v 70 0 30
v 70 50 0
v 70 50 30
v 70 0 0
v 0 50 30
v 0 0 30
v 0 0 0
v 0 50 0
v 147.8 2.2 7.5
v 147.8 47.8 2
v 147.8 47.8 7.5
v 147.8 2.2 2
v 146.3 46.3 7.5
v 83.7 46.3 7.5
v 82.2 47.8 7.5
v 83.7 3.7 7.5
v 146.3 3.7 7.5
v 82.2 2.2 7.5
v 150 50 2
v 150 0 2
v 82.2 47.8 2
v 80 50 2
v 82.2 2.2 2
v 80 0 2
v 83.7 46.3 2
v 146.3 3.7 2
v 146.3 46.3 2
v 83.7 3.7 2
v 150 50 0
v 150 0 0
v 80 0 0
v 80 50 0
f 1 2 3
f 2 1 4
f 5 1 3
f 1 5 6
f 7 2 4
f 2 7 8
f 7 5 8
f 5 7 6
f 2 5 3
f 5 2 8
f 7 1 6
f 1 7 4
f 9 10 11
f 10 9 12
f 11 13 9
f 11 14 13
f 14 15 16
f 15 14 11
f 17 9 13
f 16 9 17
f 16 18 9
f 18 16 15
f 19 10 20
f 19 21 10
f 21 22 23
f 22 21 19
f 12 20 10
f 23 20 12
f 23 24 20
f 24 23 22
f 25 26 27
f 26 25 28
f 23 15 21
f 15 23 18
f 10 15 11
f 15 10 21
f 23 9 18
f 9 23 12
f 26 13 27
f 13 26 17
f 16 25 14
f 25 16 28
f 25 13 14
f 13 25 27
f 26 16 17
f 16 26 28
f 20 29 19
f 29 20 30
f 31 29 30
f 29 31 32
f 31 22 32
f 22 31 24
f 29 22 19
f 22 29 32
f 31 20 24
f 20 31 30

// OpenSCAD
// Two-part enclosure for electronics board (Box + Lid)
// Part 1: Box (70x50x30, 2mm walls, 2mm floor, open top)
// Part 2: Lid (70x50 plate with 65.6x45.6 hollow lip, 0.2mm clearance)
// Orientation: Both rest on XY plane (Z=0). Lid is on +X side.

// Dimensions
BOX_X  = 70;
BOX_Y  = 50;
BOX_Z  = 30;
WALL   = 2;
FLOOR  = 2;

LID_PLATE_X = 70;
LID_PLATE_Y = 50;
LID_PLATE_T = 2;

LIP_OUT_X  = 65.6;
LIP_OUT_Y  = 45.6;
LIP_WALL_T = 1.5;
LIP_H      = 4;

// Gap between parts
GAP = 10;

$fn = 64;

// --- Part 1: The Box ---
// Constructed by extruding a 2D profile with a hole for the opening.
// Profile: Outer rect 70x50, Inner rect (opening) 66x46 at bottom.
// Thickness: 2mm.

module box() {
    // Base block
    translate([0, 0, 0]) 
        cube([BOX_X, BOX_Y, BOX_Z]);
    
    // Cut the top opening
    // The opening is a hole through the top, but the floor remains.
    // Hole dimensions: (BOX_X - 2*WALL) x (BOX_Y - 2*WALL)
    // Hole depth: BOX_Z - FLOOR
    translate([WALL, WALL, BOX_Z - FLOOR])
        cube([BOX_X - 2 * WALL, BOX_Y - 2 * WALL, FLOOR]);
}

// --- Part 2: The Lid ---
// A plate 70x50x2 with a hollow lip on top.
// The lip is a rectangular tube: Outer 65.6x45.6, Wall 1.5mm, Height 4mm.
// Lip sits on top of the plate.

module lid() {
    // Main plate
    translate([0, 0, 0])
        cube([LID_PLATE_X, LID_PLATE_Y, LID_PLATE_T]);
    
    // Lip
    // Lip outer dimensions: 65.6 x 45.6
    // Lip wall thickness: 1.5
    // Lip height: 4
    // Position: Centred on the plate.
    // Plate is 70x50. Lip is 65.6x45.6.
    // Offset X = (70 - 65.6) / 2 = 2.2
    // Offset Y = (50 - 45.6) / 2 = 2.2
    
    lip_offset_x = (LID_PLATE_X - LIP_OUT_X) / 2;
    lip_offset_y = (LID_PLATE_Y - LIP_OUT_Y) / 2;
    
    // Calculate inner dimensions for the hollow lip
    lip_in_x = LIP_OUT_X - 2 * LIP_WALL_T;
    lip_in_y = LIP_OUT_Y - 2 * LIP_WALL_T;
    
    // Create the lip using difference to make it hollow
    difference() {
        // Outer block of the lip
        translate([lip_offset_x, lip_offset_y, LID_PLATE_T])
            cube([LIP_OUT_X, LIP_OUT_Y, LIP_WALL_T + LIP_H]);
        
        // Inner hole of the lip (cutting through the lip height)
        // The hole goes through the lip thickness (LIP_WALL_T + LIP_H)
        translate([lip_offset_x + LIP_WALL_T, lip_offset_y + LIP_WALL_T, LID_PLATE_T])
            cube([lip_in_x, lip_in_y, LIP_WALL_T + LIP_H]);
    }
}

// --- Assembly ---
// Place Box at origin.
// Place Lid at +X side with 10mm gap.
// Lid X position = BOX_X + GAP = 70 + 10 = 80.
// Lid Y position = 0 (centred).
// Lid Z position = 0 (resting on bed).

translate([0, 0, 0]) box();
translate([BOX_X + GAP, 0, 0]) lid();
